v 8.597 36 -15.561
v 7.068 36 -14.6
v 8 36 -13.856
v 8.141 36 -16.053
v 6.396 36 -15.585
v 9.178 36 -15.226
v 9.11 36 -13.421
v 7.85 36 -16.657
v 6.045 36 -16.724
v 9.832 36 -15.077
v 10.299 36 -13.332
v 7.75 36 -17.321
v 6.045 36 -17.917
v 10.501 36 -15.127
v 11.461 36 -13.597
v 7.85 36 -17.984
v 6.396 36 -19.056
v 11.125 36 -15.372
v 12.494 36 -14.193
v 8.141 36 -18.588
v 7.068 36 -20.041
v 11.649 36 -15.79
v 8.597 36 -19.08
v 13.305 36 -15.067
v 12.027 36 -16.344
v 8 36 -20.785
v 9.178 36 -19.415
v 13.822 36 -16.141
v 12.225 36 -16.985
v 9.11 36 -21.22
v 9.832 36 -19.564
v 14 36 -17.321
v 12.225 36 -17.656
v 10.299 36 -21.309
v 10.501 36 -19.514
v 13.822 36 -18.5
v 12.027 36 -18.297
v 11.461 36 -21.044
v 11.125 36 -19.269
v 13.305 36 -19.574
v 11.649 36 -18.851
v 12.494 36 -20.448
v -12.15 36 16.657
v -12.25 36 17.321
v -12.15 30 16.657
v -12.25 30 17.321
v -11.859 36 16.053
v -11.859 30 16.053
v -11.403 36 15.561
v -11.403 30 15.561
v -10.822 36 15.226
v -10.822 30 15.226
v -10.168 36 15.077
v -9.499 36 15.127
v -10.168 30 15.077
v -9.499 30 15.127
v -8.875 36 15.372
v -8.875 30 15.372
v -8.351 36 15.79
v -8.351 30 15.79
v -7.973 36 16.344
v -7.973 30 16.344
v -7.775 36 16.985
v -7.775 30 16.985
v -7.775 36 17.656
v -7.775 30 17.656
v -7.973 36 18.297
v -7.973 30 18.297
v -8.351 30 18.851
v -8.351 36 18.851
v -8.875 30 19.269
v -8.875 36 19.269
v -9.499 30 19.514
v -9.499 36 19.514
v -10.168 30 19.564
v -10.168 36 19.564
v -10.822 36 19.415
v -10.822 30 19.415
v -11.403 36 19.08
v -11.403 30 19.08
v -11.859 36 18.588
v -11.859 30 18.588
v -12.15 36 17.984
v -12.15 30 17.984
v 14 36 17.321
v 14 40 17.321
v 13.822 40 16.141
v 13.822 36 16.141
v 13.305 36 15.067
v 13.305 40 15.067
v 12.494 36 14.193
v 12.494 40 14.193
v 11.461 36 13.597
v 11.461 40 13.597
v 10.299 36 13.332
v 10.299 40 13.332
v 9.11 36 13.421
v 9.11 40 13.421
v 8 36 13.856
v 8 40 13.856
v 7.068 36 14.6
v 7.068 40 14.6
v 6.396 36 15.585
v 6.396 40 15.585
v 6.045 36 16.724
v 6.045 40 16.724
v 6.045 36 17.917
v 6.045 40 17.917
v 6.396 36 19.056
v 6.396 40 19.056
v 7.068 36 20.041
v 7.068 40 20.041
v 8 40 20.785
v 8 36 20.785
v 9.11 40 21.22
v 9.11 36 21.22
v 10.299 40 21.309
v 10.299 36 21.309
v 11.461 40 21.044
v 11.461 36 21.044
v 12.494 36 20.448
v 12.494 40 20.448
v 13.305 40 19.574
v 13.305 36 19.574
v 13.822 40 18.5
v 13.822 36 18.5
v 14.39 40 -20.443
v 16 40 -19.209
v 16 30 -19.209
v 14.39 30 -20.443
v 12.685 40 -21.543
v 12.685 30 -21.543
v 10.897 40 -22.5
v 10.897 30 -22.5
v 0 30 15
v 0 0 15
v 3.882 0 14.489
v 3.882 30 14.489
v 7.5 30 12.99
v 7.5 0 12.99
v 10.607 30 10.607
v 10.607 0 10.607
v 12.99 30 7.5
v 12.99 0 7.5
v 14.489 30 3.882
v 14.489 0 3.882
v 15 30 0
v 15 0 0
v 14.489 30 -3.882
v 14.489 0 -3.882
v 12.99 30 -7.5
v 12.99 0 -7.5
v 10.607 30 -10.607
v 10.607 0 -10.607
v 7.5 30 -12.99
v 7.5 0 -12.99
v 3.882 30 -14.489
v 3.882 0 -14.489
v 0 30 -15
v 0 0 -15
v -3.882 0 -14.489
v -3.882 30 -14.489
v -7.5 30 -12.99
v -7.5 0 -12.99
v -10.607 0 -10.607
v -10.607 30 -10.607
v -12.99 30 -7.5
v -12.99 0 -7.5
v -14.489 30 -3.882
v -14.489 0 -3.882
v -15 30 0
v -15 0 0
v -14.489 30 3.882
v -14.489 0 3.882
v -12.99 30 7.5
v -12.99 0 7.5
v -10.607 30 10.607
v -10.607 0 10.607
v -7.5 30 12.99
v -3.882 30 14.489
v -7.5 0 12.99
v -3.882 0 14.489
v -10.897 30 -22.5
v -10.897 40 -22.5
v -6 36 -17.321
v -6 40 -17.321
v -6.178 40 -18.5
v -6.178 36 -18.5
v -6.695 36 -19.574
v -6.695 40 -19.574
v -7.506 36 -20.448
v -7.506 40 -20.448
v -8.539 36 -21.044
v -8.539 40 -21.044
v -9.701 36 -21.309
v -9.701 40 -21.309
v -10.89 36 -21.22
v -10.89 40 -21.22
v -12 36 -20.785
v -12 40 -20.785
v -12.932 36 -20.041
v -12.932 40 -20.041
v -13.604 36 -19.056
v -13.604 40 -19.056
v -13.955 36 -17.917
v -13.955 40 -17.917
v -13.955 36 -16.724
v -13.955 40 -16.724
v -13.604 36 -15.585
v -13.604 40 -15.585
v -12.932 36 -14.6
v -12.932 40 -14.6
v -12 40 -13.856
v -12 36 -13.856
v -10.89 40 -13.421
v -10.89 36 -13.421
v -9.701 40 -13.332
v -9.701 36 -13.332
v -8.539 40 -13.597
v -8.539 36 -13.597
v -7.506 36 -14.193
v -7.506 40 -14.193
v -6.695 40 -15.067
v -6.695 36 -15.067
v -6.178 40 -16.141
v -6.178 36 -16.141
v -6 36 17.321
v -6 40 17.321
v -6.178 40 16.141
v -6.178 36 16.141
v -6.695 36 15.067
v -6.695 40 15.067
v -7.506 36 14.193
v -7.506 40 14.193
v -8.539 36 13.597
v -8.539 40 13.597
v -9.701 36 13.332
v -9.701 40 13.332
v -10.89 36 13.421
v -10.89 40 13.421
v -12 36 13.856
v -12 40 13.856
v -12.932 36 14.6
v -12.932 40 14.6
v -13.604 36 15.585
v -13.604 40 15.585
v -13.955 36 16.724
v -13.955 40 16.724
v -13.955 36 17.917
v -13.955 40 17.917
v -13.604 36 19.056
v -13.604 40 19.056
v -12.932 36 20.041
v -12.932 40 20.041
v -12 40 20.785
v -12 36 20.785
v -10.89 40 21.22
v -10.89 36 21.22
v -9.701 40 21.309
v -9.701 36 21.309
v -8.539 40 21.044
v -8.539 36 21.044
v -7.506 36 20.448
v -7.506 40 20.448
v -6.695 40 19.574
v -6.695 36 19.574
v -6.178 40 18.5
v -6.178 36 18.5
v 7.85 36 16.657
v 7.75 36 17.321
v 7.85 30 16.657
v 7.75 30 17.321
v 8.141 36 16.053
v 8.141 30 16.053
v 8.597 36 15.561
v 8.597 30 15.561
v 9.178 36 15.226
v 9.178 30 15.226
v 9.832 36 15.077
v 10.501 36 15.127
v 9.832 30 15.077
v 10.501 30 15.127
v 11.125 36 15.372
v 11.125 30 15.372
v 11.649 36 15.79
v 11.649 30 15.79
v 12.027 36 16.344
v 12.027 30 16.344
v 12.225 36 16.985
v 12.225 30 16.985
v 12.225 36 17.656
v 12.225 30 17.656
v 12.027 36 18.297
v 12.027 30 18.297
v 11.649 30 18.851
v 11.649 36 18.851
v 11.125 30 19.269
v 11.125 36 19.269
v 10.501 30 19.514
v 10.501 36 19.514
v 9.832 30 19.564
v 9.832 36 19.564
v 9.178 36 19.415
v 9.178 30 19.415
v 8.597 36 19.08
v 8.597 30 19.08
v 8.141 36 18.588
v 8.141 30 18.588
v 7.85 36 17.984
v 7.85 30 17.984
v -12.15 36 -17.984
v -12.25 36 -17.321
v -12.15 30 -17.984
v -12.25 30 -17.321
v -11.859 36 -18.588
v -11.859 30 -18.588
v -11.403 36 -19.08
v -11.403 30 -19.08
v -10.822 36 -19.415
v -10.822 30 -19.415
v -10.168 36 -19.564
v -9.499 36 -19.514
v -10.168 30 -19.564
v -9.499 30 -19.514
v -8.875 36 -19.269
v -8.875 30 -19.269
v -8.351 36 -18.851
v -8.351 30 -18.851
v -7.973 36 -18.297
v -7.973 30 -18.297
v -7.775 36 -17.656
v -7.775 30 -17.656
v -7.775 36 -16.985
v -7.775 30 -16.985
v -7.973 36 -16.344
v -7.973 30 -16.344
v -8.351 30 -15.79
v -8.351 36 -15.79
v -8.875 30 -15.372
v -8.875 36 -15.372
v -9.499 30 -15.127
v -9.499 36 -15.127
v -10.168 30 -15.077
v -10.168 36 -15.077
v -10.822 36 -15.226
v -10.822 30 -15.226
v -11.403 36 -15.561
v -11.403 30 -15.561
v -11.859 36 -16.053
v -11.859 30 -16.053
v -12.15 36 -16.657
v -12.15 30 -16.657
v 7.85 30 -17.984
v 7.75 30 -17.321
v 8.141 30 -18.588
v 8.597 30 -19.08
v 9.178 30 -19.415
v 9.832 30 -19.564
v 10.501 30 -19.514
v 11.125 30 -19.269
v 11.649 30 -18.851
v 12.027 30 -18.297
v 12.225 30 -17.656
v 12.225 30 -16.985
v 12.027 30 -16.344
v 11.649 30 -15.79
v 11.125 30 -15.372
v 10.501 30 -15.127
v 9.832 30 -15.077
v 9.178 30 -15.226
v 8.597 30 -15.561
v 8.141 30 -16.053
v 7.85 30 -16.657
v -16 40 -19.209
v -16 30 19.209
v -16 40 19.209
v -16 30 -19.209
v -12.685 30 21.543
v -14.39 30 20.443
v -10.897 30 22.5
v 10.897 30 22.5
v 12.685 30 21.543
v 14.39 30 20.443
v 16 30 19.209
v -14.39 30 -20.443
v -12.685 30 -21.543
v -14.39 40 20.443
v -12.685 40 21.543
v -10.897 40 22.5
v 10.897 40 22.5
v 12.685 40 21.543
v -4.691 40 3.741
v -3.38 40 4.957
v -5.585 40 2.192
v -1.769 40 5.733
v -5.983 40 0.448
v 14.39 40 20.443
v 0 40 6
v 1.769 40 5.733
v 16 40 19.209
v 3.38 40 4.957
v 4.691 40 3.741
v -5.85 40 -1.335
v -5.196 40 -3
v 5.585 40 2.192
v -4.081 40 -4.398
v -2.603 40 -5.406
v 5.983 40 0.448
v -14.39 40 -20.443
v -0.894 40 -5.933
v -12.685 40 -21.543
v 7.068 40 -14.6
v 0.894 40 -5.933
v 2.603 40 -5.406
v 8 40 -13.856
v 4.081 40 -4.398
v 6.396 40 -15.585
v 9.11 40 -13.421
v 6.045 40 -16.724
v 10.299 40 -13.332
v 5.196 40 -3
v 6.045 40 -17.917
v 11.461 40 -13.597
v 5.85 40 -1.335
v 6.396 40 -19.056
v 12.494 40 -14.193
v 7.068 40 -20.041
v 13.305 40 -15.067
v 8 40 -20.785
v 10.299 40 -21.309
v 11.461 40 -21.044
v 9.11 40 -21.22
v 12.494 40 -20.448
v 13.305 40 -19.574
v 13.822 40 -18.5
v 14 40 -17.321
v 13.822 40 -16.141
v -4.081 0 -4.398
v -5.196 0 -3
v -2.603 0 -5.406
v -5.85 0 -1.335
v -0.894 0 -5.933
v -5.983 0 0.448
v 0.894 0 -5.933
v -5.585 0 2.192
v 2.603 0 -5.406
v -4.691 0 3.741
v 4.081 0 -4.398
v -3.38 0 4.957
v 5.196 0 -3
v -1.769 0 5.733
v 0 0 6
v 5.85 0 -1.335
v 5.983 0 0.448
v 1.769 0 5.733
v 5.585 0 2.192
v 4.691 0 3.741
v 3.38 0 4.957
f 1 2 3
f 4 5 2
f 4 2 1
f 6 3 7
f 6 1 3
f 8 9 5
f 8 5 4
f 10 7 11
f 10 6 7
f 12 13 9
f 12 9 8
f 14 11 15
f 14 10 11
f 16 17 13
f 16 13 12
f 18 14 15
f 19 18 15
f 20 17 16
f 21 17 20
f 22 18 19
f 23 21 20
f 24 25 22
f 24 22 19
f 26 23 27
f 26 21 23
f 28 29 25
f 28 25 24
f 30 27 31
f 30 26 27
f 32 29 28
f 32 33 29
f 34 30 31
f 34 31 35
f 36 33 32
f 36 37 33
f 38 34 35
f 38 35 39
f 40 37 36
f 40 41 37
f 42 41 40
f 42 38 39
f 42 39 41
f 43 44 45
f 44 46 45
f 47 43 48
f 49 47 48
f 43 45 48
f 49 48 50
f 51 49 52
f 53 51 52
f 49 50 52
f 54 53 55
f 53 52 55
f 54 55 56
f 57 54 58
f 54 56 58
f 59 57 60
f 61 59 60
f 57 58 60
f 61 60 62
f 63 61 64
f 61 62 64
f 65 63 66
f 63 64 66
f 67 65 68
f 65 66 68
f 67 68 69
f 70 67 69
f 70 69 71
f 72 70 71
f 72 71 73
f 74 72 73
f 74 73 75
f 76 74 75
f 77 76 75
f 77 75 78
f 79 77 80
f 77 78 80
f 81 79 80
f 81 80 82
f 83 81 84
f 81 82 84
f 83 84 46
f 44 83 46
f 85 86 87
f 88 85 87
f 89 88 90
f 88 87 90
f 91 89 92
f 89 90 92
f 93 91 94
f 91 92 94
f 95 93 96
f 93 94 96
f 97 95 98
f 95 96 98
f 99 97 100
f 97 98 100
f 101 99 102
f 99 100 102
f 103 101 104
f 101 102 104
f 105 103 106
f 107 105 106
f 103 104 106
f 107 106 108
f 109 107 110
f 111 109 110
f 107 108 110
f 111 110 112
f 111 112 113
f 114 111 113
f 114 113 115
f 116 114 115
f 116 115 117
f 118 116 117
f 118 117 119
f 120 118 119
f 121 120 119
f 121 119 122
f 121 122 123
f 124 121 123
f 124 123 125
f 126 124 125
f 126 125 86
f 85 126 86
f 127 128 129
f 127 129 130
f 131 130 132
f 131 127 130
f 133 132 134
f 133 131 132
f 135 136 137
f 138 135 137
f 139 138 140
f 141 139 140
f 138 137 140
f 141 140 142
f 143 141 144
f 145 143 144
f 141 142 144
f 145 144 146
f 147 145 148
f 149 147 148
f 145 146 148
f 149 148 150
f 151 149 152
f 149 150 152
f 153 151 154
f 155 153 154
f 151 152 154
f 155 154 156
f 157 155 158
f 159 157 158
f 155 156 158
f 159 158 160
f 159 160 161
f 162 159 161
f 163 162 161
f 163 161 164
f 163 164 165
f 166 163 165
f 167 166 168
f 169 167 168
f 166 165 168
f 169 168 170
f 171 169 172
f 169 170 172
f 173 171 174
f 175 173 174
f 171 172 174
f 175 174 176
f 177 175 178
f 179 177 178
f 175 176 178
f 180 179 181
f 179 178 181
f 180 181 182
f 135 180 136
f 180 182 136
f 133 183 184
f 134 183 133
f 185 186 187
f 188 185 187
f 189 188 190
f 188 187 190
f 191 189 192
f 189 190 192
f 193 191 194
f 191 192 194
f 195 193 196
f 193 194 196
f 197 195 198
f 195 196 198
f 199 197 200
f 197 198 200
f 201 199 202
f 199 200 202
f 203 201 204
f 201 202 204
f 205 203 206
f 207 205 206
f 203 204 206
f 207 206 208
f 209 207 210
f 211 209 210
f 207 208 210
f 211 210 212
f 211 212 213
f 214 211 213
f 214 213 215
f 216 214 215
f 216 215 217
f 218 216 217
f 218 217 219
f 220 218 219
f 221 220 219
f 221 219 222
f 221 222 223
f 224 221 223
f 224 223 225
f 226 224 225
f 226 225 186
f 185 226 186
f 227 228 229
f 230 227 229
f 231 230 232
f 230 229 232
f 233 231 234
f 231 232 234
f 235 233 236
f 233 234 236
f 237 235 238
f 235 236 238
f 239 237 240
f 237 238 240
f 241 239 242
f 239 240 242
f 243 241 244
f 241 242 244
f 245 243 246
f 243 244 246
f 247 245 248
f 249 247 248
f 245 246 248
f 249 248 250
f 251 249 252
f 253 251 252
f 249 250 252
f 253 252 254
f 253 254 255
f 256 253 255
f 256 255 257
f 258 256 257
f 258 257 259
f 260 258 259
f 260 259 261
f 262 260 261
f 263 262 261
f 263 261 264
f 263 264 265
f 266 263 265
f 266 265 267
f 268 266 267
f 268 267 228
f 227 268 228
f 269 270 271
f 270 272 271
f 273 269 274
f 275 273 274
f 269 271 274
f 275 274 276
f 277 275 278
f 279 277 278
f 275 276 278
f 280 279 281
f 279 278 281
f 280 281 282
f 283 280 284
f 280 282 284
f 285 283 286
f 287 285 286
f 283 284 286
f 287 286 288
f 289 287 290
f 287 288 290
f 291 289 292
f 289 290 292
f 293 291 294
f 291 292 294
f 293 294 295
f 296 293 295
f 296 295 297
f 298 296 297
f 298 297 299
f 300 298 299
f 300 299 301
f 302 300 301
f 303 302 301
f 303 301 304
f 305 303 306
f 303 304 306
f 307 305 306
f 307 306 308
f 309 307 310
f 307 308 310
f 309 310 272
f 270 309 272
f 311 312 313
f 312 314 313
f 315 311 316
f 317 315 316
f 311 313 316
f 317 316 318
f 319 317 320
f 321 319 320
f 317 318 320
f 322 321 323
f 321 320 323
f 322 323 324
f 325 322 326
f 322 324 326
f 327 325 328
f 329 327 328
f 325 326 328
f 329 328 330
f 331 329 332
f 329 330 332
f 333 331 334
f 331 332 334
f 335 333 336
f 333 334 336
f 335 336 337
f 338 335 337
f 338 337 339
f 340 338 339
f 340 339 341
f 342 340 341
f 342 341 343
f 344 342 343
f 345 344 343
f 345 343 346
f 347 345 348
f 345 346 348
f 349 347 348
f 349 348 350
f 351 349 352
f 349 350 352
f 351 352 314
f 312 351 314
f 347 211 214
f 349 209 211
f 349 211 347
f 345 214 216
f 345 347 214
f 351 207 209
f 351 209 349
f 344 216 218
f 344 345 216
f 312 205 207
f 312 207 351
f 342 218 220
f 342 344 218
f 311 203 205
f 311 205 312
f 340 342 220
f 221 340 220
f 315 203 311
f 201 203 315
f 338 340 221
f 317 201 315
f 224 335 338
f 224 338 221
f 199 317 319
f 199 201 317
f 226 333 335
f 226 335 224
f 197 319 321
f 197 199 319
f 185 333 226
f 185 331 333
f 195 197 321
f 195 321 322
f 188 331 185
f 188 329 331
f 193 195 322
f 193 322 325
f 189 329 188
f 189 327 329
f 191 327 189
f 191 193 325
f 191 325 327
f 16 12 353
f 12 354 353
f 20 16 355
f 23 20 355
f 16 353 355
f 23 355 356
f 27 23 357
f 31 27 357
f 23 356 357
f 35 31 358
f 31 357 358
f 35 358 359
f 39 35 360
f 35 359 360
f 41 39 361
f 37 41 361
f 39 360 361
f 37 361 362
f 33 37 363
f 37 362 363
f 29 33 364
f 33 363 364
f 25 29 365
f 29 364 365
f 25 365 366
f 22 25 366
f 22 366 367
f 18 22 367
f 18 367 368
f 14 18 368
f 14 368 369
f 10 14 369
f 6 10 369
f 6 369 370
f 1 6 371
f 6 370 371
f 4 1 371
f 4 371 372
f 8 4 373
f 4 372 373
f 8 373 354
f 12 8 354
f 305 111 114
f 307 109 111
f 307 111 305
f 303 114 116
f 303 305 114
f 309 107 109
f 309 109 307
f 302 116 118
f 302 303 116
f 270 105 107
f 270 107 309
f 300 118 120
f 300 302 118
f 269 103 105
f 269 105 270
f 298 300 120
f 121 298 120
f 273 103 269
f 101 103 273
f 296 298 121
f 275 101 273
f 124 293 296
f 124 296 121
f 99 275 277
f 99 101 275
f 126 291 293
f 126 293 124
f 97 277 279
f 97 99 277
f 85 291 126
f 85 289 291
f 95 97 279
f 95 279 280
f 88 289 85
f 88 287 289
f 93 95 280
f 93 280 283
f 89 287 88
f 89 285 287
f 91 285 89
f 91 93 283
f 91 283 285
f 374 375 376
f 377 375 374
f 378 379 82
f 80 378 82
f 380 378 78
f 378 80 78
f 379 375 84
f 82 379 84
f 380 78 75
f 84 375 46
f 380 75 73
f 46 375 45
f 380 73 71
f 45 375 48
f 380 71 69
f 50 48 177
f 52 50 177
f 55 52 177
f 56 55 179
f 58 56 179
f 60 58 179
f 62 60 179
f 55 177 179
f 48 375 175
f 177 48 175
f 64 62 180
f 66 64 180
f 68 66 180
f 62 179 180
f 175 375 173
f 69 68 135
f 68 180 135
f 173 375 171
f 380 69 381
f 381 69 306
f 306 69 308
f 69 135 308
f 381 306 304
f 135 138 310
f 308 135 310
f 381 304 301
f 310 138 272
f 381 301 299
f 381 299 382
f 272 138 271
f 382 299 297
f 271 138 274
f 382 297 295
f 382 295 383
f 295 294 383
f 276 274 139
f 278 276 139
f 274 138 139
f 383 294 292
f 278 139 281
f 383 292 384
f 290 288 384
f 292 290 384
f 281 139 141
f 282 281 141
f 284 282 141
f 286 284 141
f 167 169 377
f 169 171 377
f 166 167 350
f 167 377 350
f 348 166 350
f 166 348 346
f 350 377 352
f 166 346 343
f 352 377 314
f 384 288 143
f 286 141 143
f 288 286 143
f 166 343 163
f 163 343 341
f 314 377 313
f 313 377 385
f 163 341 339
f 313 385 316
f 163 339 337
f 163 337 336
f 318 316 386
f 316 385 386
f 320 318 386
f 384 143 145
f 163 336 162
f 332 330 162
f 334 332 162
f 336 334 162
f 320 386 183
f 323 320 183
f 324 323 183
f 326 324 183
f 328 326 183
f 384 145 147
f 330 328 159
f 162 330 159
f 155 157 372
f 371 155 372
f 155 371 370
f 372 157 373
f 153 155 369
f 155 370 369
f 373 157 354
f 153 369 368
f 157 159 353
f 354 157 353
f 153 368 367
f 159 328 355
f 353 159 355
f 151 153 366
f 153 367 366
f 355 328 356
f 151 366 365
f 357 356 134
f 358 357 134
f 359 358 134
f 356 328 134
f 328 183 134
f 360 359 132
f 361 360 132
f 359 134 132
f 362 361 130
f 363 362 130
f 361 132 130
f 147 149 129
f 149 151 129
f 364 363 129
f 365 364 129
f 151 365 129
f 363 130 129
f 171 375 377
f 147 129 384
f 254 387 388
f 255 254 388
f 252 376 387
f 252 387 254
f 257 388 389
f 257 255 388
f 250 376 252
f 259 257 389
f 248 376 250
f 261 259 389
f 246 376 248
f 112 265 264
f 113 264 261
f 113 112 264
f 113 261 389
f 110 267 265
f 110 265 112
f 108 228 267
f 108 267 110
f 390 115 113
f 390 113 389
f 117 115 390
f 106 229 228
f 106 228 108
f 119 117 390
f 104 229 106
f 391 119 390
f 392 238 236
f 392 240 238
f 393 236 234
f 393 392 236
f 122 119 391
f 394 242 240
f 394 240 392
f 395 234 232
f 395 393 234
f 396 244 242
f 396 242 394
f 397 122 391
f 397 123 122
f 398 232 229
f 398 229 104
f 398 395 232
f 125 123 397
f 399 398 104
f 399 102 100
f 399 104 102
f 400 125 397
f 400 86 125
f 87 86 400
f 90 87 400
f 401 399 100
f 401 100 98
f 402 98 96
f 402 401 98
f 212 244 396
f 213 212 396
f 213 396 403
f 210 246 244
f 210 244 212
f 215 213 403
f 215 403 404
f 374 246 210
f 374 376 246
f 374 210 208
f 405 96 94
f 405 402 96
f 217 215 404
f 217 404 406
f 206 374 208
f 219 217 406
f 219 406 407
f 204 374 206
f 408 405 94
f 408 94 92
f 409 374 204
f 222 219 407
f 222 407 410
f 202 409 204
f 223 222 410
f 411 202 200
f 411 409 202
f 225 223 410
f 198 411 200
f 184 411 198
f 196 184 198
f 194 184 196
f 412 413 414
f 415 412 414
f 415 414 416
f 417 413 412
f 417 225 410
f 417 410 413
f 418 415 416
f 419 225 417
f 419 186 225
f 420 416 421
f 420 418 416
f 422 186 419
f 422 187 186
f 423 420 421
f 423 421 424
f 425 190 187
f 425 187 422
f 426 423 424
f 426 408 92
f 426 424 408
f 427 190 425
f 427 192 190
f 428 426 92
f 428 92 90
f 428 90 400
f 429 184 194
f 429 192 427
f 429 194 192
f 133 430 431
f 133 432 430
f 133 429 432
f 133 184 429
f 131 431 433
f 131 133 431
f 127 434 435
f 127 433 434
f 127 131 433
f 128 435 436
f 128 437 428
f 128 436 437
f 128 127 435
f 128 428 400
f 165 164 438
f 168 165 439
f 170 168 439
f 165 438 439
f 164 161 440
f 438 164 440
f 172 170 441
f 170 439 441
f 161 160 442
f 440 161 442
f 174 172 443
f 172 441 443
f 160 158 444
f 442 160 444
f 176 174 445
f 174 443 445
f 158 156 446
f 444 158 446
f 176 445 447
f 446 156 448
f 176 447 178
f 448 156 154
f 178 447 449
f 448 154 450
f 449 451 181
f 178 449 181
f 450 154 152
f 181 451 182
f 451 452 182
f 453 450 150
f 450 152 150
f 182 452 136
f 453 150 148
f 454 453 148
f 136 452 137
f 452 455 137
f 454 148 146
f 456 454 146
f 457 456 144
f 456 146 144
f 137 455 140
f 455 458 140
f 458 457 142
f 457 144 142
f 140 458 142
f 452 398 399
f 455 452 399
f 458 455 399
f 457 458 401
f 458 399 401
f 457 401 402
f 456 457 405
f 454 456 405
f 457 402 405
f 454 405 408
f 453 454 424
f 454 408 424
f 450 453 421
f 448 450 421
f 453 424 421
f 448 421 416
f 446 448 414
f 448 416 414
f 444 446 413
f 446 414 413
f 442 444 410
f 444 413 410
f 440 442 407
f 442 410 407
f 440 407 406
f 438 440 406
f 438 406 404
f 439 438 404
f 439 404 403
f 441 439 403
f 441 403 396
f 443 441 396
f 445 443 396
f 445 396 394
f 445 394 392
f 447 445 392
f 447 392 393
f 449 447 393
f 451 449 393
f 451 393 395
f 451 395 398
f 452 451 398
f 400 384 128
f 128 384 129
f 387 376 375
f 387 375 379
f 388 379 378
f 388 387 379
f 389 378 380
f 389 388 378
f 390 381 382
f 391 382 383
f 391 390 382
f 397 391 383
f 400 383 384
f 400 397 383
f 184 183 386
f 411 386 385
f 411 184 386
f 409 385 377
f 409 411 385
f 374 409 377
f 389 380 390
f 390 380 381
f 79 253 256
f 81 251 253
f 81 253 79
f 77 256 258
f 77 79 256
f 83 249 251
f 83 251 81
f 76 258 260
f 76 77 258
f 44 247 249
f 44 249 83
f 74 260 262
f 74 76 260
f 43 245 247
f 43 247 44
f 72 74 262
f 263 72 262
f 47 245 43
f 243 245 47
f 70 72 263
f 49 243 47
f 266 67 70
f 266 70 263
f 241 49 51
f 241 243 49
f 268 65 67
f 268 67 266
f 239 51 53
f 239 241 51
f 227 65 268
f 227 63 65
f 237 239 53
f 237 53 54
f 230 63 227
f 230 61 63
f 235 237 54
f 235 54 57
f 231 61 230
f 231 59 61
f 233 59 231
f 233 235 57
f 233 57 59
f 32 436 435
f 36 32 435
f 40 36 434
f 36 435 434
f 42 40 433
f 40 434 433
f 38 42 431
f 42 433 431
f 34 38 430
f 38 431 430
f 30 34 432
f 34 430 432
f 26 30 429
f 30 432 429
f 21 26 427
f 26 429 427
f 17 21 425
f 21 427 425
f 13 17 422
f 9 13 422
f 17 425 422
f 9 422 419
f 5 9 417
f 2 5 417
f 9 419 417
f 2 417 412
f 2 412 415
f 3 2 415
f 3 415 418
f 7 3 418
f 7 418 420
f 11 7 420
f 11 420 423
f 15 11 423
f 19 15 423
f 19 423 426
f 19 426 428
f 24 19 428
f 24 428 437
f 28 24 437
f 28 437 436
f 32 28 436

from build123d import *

# Parameters (mm, degrees)
SKETCH_1_R                   = 15
EXTRUDE_1_DEPTH              = 30
SKETCH_2_W                   = 32
SKETCH_2_H                   = 45
EXTRUDE_2_DEPTH              = 10
HOLE_WIZARD_M4_1_D           = 4.5
HOLE_WIZARD_M4_1_CBORE_D     = 8
HOLE_WIZARD_M4_1_CBORE_DEPTH = 4
SKETCH_6_W                   = 78.990137636
SKETCH_6_H                   = 62.836735256
SKETCH_6_R                   = 25
CUT_EXTRUDE_1_DEPTH          = 30
SKETCH_7_R                   = 6
CUT_EXTRUDE_2_DEPTH          = 49.602983448


with BuildPart() as part:
    # 스케치1 → 보스-돌출1 (new body)
    with BuildSketch(Plane(origin=(0, 0, 0), x_dir=(1, 0, 0), z_dir=(0, 1, 0))):
        with Locations(Location((0, 0, 0), (0, 0, 270))):
            Circle(SKETCH_1_R)
    extrude(amount=EXTRUDE_1_DEPTH)

    # 스케치2 → 보스-돌출2 (add)
    with BuildSketch(Plane(origin=(0, 30, 0), x_dir=(1, 0, 0), z_dir=(0, 1, 0))):
        Rectangle(SKETCH_2_W, SKETCH_2_H)
    extrude(amount=EXTRUDE_2_DEPTH)

    # M4 소켓 머리 캡 나사용 카운터보어1 (through all)
    with Locations(Plane(origin=(0, 40, 0), x_dir=(1, 0, 0), z_dir=(0, 1, 0))):
        with Locations((-10, 17.320508076), (10, 17.320508076), (10, -17.320508076), (-10, -17.320508076)):
            CounterBoreHole(HOLE_WIZARD_M4_1_D / 2, HOLE_WIZARD_M4_1_CBORE_D / 2, HOLE_WIZARD_M4_1_CBORE_DEPTH)

    # 스케치6 → 컷-돌출1 (cut)
    with BuildSketch(Plane(origin=(0, 40, 0), x_dir=(1, 0, 0), z_dir=(0, 1, 0))):
        Rectangle(SKETCH_6_W, SKETCH_6_H)
        Circle(SKETCH_6_R, mode=Mode.SUBTRACT)
    extrude(amount=-CUT_EXTRUDE_1_DEPTH, mode=Mode.SUBTRACT)

    # 스케치7 → 컷-돌출2 (cut, through all)
    with BuildSketch(Plane(origin=(0, 40, 0), x_dir=(1, 0, 0), z_dir=(0, 1, 0))):
        with Locations(Location((0, 0, 0), (0, 0, 270))):
            Circle(SKETCH_7_R)
    extrude(amount=-CUT_EXTRUDE_2_DEPTH, mode=Mode.SUBTRACT)


solid = part.part
